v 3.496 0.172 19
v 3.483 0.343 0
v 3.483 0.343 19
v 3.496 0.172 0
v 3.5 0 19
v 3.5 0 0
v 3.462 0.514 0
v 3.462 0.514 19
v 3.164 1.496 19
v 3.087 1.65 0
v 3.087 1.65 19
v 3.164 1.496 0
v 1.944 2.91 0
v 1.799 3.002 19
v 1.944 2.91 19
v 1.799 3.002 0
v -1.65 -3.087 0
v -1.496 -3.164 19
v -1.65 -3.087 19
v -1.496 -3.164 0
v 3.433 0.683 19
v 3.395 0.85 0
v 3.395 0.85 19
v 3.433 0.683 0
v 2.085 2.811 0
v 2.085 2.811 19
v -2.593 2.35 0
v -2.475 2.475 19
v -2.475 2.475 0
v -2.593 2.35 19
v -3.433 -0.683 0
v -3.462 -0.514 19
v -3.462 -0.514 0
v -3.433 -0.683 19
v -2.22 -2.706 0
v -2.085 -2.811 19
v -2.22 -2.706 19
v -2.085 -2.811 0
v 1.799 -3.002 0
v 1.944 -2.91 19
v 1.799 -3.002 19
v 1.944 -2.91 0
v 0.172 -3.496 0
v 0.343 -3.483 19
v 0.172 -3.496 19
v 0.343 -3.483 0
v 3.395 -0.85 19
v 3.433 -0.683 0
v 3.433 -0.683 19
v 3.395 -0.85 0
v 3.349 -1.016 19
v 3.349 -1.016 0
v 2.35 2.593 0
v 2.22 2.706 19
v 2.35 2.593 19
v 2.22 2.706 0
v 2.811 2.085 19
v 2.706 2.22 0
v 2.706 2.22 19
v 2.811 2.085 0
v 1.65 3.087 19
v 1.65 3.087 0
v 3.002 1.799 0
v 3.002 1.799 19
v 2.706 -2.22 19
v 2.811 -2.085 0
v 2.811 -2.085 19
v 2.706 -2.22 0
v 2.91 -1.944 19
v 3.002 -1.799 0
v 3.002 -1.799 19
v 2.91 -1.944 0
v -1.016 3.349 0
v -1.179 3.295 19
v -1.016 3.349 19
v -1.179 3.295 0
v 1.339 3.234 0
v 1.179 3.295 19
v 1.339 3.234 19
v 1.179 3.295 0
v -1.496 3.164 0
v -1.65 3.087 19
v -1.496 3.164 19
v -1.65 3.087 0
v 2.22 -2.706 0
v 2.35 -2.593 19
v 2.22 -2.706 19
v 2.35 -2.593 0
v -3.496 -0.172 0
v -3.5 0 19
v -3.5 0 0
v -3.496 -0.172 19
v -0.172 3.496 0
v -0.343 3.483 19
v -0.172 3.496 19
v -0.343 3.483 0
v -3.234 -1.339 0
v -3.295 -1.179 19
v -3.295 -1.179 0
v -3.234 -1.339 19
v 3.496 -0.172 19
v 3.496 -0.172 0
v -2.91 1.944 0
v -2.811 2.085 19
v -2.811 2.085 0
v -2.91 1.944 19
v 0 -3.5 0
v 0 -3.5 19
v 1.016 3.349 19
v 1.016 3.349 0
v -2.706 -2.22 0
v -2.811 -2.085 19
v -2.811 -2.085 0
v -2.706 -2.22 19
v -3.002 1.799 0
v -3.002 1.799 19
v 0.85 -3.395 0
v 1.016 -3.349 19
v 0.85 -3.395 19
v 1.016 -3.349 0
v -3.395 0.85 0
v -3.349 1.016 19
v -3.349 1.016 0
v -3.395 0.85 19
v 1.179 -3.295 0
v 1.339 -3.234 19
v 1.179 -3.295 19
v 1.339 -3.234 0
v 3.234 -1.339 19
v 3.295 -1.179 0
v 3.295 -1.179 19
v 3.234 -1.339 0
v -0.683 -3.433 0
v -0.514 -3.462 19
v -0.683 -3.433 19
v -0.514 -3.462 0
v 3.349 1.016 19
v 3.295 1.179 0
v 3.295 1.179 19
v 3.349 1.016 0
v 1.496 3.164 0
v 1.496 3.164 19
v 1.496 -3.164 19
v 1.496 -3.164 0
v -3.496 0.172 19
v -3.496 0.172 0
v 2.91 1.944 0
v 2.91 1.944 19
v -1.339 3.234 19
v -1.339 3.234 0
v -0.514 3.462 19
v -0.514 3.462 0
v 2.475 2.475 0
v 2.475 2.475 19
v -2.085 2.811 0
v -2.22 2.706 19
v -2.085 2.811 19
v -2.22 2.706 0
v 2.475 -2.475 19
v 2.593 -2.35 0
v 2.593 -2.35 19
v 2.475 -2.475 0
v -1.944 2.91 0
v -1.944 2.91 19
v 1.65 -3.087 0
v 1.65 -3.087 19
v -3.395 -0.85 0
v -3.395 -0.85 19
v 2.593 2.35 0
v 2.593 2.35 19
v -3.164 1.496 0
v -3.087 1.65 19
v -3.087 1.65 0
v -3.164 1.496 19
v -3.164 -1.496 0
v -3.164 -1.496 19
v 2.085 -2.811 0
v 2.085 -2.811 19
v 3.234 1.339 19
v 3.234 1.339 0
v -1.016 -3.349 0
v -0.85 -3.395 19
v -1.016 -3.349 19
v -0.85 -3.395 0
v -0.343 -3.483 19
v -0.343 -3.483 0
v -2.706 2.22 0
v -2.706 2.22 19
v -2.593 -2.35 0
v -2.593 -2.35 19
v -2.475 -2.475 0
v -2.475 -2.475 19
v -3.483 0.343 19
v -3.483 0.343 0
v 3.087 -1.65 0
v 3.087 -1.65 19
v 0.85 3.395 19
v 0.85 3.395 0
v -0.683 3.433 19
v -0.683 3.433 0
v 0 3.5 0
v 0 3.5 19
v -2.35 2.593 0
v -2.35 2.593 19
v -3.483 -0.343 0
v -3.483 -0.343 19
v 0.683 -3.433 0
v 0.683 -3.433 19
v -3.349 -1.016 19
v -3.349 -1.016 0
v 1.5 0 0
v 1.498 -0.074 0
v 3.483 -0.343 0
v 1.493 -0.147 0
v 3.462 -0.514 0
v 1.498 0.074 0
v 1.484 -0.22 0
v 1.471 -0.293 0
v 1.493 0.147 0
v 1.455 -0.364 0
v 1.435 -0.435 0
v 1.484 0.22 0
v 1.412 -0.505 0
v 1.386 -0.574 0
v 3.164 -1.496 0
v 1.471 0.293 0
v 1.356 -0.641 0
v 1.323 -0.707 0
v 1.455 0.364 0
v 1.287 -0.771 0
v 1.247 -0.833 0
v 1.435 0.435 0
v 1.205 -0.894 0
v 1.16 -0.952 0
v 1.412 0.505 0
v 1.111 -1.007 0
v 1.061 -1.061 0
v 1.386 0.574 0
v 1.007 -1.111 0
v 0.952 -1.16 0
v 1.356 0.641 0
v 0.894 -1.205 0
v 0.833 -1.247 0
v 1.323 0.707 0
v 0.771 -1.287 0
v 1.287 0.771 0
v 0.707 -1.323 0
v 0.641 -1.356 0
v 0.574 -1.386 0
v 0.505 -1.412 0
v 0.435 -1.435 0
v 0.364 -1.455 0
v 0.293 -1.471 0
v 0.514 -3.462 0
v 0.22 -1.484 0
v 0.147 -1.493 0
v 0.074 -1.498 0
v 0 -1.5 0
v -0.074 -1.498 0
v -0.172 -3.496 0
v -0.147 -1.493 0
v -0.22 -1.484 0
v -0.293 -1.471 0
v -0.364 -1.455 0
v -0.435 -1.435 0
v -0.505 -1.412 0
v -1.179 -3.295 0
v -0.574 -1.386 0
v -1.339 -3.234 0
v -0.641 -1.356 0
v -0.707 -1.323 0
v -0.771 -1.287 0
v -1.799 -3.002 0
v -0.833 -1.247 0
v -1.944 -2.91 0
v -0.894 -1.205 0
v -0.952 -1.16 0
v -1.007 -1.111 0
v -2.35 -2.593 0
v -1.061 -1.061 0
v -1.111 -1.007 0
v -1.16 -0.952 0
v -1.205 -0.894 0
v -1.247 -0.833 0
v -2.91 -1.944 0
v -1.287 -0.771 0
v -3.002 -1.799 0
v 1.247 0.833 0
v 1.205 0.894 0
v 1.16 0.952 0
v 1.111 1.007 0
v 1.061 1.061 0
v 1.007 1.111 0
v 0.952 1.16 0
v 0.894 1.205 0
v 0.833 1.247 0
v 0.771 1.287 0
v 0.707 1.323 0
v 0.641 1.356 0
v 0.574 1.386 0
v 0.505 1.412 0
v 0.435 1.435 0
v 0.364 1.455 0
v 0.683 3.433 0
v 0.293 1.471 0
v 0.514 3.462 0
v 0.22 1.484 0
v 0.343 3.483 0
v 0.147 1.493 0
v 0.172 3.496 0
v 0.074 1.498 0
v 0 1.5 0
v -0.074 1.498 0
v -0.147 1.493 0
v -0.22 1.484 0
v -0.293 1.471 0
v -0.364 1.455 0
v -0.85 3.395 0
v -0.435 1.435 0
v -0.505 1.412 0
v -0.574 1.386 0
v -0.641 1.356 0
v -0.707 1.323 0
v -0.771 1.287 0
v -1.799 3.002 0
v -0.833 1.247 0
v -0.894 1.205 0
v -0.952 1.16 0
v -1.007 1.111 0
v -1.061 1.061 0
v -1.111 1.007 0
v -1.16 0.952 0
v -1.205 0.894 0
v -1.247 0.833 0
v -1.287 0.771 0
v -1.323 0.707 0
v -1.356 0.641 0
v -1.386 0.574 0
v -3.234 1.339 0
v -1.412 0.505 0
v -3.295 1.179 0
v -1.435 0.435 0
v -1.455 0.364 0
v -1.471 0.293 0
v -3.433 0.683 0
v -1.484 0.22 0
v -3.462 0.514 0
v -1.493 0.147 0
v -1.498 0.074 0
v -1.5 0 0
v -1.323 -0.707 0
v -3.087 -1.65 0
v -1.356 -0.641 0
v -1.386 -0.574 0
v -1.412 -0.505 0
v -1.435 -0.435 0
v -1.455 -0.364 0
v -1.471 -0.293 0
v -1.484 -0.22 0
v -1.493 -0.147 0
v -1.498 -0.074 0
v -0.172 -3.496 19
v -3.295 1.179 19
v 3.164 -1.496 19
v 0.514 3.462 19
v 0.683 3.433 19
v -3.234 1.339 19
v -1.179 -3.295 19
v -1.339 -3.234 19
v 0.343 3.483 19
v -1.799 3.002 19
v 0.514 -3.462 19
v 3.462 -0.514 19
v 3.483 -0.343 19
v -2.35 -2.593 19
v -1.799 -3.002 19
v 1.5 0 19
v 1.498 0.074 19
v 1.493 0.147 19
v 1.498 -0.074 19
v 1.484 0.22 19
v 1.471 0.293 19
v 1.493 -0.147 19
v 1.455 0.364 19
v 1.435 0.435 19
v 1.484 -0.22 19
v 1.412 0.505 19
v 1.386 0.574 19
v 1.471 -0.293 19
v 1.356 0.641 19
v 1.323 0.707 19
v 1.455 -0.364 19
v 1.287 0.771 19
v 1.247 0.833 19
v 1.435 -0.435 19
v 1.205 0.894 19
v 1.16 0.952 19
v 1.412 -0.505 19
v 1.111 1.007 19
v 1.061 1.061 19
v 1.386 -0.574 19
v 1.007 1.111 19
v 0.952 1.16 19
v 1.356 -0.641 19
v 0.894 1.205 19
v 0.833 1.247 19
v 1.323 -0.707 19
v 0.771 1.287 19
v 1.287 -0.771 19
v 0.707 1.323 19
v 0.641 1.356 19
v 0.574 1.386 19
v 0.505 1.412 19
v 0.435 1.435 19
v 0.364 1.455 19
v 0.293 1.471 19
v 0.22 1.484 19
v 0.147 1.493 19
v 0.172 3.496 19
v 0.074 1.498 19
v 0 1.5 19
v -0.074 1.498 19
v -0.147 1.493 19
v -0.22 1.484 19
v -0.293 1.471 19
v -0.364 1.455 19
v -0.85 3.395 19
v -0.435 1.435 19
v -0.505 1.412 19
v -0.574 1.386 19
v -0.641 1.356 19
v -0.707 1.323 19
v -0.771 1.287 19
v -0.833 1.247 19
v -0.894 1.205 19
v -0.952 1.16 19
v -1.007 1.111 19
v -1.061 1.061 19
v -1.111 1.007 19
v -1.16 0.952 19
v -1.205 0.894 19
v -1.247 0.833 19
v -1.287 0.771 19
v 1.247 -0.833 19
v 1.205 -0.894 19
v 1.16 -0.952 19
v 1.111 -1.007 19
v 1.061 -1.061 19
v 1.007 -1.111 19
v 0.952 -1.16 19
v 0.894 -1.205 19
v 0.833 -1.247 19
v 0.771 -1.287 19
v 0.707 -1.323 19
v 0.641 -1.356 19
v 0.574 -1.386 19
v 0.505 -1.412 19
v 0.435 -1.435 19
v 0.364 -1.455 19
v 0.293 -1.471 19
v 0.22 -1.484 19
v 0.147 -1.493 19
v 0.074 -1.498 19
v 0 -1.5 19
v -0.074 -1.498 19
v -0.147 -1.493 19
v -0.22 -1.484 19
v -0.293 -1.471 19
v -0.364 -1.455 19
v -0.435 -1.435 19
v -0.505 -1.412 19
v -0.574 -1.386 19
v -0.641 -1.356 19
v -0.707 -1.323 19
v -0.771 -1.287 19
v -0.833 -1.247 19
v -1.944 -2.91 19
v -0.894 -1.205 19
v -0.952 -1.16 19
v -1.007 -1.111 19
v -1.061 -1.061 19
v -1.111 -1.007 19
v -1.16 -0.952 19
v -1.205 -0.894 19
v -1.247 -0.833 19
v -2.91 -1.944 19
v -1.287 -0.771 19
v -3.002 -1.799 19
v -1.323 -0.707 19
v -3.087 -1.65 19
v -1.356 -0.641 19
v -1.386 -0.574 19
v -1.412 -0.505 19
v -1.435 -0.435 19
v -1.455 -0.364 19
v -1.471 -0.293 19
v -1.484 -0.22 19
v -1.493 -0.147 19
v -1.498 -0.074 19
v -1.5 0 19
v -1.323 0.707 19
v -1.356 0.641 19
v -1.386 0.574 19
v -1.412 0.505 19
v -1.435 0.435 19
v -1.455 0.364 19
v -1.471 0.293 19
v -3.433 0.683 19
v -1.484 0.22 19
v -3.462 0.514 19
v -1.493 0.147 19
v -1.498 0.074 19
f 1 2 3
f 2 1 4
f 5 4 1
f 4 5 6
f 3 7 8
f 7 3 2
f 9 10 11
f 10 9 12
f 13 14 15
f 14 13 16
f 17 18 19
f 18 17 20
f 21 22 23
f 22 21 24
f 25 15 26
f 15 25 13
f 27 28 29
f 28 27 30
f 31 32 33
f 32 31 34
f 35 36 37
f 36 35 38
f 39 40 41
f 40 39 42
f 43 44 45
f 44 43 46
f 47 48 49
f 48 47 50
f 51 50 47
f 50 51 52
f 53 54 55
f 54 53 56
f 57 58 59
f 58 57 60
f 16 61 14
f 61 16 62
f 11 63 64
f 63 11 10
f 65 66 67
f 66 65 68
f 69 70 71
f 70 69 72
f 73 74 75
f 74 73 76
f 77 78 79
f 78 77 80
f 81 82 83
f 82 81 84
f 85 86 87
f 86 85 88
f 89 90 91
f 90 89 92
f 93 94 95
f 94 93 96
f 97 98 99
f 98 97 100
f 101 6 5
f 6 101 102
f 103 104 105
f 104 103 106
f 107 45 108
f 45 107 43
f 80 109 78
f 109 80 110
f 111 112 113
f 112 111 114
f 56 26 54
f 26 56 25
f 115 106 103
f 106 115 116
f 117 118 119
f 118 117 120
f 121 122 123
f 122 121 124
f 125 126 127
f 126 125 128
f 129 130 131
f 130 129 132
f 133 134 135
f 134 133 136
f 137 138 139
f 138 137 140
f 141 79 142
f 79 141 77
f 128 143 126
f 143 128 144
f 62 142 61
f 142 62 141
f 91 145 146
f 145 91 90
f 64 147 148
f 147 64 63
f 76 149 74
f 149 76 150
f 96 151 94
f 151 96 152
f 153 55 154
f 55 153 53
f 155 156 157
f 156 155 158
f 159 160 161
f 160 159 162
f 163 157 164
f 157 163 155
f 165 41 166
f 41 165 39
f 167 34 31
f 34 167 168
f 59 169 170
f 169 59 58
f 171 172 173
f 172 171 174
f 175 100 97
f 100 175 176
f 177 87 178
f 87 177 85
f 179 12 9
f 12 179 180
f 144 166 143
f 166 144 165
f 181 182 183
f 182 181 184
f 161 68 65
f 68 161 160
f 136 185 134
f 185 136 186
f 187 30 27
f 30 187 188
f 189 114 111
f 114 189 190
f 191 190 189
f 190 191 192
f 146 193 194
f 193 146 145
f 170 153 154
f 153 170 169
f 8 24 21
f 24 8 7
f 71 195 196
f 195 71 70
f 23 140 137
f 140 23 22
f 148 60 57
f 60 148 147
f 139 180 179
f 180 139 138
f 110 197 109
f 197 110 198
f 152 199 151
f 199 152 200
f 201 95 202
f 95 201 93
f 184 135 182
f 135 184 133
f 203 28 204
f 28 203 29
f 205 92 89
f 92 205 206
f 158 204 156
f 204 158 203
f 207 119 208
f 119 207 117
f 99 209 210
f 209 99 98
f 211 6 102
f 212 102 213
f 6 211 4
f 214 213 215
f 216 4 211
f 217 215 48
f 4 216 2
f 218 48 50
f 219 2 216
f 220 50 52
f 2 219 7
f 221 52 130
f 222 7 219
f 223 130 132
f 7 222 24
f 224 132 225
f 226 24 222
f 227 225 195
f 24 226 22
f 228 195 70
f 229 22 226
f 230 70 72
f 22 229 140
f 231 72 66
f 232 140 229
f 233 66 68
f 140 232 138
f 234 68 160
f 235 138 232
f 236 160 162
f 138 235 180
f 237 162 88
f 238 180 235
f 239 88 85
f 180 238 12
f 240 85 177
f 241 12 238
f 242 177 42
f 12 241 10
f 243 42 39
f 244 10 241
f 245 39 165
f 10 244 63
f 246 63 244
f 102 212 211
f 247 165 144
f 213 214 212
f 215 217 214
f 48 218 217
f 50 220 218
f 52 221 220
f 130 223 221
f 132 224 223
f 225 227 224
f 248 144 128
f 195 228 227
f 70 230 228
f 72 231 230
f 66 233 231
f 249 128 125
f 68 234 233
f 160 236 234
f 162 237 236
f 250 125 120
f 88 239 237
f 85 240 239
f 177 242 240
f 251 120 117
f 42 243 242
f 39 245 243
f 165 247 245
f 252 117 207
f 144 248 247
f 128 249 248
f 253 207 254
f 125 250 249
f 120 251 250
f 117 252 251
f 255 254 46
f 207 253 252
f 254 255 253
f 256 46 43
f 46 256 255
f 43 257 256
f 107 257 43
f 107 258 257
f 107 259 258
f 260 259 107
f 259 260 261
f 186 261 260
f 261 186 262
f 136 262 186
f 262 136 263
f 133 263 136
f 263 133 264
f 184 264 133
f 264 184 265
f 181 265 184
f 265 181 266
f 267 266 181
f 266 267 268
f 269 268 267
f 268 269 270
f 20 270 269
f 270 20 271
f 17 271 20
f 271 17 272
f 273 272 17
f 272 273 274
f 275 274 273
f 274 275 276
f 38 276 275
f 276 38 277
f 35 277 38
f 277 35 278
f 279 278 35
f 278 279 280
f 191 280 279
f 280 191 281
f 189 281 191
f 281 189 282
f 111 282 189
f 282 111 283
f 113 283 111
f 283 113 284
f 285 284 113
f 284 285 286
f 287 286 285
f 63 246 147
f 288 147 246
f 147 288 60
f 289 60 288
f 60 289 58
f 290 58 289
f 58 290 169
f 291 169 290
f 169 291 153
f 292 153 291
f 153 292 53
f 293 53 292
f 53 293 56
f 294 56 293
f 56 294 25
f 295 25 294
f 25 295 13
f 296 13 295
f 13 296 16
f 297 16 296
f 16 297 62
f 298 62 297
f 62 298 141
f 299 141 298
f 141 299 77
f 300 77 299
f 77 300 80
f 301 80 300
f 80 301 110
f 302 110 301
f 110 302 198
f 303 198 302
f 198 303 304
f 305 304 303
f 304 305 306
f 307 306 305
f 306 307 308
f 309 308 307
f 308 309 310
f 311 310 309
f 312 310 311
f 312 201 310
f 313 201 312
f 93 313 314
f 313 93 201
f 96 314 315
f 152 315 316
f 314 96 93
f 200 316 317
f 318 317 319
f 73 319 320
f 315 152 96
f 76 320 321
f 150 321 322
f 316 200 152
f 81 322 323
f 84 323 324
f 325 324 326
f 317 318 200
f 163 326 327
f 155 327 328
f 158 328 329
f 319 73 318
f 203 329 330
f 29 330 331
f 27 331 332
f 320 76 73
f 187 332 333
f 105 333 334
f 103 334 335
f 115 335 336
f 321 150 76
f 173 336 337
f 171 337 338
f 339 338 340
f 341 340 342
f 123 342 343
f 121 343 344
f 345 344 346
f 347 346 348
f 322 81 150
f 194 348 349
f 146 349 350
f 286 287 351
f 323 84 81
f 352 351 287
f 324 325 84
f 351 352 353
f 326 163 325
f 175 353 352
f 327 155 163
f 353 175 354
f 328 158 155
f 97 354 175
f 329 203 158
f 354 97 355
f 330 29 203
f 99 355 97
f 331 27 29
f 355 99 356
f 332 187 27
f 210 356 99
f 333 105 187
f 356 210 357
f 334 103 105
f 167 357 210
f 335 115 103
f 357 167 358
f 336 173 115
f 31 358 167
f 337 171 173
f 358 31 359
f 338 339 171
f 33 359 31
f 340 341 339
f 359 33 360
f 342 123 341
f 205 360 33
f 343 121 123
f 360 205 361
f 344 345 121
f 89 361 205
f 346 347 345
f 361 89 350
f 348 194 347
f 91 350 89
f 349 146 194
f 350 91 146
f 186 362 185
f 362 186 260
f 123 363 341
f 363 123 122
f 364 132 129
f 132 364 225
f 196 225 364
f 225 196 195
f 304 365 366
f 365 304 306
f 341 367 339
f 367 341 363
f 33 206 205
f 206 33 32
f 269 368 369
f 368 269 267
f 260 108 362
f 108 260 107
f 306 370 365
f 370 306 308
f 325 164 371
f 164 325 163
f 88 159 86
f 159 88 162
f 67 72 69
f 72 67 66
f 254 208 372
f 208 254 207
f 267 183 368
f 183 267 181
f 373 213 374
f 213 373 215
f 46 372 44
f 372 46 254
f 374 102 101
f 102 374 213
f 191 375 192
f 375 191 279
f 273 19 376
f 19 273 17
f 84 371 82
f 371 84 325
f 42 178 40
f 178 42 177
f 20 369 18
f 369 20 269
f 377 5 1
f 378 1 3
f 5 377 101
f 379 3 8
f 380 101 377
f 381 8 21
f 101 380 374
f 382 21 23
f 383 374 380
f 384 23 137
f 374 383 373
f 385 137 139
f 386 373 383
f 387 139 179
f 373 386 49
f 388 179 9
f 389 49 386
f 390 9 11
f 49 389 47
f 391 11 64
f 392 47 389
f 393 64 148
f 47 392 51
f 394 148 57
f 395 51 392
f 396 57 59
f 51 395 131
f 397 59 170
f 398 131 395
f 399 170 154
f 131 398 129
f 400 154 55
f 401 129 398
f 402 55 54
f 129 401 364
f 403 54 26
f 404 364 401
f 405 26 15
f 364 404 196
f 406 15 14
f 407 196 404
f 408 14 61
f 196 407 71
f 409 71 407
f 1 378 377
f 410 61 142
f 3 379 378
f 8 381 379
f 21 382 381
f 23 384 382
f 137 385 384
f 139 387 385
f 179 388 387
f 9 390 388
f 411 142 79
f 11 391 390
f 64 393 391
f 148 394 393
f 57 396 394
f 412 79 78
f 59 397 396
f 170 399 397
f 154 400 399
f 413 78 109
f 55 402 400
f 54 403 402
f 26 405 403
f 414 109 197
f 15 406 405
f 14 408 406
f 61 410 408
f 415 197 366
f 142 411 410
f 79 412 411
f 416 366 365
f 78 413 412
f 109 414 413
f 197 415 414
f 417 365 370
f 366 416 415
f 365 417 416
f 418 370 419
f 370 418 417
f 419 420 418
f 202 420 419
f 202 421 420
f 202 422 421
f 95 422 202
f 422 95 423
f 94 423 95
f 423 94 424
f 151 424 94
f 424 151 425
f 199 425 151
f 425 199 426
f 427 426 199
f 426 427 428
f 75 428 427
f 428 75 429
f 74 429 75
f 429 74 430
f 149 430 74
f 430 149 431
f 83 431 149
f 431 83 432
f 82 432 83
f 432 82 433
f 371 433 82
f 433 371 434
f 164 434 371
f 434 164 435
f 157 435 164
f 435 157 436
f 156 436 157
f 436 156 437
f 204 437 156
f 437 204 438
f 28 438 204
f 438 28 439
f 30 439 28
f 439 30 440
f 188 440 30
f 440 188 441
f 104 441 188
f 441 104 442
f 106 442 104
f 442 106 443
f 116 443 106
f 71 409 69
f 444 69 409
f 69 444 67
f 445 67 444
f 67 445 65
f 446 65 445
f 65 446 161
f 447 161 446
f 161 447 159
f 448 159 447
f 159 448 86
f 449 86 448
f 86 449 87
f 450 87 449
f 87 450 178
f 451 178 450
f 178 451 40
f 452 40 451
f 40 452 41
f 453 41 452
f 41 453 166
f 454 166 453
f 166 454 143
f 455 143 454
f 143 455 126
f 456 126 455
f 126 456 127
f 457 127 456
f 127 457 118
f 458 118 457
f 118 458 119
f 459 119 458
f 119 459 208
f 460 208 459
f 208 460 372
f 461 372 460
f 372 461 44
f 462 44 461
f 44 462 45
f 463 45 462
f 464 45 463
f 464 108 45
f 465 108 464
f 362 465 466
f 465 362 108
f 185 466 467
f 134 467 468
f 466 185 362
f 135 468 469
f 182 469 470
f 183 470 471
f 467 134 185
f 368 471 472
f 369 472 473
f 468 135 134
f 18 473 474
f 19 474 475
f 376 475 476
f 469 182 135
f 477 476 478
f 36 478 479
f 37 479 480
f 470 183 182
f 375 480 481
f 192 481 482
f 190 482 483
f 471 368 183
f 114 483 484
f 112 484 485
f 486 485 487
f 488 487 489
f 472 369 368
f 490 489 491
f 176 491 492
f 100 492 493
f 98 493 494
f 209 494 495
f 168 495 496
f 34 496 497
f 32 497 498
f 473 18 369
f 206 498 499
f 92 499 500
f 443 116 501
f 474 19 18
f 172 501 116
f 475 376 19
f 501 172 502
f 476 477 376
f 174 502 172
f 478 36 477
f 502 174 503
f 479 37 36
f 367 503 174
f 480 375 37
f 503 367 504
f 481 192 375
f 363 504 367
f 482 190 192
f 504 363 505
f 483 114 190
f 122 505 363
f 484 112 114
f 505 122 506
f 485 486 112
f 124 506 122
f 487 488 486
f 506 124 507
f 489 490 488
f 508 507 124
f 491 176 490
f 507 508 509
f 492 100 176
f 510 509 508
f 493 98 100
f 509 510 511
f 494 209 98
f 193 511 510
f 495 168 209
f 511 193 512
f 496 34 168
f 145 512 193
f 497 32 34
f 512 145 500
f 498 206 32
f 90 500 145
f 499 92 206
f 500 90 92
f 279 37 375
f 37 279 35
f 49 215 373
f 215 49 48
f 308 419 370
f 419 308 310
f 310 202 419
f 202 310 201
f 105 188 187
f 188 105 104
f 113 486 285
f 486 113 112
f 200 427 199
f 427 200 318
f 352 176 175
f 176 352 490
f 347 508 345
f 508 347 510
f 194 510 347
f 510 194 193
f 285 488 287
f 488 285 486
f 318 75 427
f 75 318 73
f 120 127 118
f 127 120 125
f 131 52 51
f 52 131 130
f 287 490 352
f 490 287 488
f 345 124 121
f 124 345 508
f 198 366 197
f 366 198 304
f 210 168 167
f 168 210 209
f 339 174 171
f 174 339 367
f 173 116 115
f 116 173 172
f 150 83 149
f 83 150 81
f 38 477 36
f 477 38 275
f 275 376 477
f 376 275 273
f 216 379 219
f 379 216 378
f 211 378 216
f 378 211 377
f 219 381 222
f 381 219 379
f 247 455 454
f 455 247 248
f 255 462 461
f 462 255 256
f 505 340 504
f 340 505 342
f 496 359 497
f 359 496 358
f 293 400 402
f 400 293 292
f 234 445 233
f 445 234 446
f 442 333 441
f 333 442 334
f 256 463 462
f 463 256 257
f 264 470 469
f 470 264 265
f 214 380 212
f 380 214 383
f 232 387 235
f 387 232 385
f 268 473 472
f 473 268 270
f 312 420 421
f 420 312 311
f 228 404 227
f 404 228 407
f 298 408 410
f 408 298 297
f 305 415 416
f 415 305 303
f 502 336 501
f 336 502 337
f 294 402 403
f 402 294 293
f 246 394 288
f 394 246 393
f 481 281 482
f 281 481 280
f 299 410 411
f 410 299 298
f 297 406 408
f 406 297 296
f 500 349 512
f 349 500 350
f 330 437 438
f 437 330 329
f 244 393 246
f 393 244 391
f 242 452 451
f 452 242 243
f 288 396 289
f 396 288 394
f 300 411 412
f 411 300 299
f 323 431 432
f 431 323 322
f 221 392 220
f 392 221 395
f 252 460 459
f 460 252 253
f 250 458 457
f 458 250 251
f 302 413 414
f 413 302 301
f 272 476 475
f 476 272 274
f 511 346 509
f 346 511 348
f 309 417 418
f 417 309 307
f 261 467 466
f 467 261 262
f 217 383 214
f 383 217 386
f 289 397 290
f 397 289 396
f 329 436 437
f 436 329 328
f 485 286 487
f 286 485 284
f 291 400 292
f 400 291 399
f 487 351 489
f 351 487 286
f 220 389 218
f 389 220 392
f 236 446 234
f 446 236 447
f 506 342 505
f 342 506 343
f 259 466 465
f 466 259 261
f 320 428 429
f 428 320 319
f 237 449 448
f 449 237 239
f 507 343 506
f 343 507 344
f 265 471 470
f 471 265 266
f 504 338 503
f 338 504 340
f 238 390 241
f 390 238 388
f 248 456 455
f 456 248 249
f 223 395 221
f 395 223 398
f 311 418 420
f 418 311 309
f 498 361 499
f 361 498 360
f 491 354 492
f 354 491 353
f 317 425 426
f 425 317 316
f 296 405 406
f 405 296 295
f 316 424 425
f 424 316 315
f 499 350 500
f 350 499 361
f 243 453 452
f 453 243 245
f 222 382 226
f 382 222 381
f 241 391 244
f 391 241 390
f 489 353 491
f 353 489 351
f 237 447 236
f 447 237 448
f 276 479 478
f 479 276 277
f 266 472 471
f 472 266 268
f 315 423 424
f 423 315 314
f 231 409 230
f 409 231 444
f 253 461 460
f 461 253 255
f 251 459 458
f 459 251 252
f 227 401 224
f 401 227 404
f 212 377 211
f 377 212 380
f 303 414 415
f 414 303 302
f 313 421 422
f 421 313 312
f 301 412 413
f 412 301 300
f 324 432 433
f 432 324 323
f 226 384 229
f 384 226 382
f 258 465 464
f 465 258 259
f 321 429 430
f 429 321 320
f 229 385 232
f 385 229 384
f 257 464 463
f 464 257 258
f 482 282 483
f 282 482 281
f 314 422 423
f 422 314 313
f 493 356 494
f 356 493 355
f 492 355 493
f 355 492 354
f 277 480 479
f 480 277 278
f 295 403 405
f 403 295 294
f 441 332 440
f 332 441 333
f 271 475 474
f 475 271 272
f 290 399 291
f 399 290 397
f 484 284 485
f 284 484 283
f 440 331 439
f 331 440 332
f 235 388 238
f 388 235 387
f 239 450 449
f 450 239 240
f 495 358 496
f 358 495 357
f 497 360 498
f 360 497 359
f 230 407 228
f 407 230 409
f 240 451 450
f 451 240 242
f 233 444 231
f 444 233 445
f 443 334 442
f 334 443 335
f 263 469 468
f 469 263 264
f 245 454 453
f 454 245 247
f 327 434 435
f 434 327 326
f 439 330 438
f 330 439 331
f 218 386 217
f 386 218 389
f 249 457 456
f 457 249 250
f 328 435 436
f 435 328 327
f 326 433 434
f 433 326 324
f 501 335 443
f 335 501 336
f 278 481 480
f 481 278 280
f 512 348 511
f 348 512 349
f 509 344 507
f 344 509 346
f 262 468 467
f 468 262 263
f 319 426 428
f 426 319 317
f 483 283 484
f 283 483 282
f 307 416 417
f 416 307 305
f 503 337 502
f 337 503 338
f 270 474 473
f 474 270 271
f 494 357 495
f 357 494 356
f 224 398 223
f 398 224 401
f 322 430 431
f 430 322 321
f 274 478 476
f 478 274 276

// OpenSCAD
$fn = 128;

bore_d = 3.0;
outer_d = 7.0;
length = 19.0;

difference() {
  cylinder(d = outer_d, h = length, center = false);
  translate([0, 0, -0.1])
    cylinder(d = bore_d, h = length + 0.2, center = false);
}
